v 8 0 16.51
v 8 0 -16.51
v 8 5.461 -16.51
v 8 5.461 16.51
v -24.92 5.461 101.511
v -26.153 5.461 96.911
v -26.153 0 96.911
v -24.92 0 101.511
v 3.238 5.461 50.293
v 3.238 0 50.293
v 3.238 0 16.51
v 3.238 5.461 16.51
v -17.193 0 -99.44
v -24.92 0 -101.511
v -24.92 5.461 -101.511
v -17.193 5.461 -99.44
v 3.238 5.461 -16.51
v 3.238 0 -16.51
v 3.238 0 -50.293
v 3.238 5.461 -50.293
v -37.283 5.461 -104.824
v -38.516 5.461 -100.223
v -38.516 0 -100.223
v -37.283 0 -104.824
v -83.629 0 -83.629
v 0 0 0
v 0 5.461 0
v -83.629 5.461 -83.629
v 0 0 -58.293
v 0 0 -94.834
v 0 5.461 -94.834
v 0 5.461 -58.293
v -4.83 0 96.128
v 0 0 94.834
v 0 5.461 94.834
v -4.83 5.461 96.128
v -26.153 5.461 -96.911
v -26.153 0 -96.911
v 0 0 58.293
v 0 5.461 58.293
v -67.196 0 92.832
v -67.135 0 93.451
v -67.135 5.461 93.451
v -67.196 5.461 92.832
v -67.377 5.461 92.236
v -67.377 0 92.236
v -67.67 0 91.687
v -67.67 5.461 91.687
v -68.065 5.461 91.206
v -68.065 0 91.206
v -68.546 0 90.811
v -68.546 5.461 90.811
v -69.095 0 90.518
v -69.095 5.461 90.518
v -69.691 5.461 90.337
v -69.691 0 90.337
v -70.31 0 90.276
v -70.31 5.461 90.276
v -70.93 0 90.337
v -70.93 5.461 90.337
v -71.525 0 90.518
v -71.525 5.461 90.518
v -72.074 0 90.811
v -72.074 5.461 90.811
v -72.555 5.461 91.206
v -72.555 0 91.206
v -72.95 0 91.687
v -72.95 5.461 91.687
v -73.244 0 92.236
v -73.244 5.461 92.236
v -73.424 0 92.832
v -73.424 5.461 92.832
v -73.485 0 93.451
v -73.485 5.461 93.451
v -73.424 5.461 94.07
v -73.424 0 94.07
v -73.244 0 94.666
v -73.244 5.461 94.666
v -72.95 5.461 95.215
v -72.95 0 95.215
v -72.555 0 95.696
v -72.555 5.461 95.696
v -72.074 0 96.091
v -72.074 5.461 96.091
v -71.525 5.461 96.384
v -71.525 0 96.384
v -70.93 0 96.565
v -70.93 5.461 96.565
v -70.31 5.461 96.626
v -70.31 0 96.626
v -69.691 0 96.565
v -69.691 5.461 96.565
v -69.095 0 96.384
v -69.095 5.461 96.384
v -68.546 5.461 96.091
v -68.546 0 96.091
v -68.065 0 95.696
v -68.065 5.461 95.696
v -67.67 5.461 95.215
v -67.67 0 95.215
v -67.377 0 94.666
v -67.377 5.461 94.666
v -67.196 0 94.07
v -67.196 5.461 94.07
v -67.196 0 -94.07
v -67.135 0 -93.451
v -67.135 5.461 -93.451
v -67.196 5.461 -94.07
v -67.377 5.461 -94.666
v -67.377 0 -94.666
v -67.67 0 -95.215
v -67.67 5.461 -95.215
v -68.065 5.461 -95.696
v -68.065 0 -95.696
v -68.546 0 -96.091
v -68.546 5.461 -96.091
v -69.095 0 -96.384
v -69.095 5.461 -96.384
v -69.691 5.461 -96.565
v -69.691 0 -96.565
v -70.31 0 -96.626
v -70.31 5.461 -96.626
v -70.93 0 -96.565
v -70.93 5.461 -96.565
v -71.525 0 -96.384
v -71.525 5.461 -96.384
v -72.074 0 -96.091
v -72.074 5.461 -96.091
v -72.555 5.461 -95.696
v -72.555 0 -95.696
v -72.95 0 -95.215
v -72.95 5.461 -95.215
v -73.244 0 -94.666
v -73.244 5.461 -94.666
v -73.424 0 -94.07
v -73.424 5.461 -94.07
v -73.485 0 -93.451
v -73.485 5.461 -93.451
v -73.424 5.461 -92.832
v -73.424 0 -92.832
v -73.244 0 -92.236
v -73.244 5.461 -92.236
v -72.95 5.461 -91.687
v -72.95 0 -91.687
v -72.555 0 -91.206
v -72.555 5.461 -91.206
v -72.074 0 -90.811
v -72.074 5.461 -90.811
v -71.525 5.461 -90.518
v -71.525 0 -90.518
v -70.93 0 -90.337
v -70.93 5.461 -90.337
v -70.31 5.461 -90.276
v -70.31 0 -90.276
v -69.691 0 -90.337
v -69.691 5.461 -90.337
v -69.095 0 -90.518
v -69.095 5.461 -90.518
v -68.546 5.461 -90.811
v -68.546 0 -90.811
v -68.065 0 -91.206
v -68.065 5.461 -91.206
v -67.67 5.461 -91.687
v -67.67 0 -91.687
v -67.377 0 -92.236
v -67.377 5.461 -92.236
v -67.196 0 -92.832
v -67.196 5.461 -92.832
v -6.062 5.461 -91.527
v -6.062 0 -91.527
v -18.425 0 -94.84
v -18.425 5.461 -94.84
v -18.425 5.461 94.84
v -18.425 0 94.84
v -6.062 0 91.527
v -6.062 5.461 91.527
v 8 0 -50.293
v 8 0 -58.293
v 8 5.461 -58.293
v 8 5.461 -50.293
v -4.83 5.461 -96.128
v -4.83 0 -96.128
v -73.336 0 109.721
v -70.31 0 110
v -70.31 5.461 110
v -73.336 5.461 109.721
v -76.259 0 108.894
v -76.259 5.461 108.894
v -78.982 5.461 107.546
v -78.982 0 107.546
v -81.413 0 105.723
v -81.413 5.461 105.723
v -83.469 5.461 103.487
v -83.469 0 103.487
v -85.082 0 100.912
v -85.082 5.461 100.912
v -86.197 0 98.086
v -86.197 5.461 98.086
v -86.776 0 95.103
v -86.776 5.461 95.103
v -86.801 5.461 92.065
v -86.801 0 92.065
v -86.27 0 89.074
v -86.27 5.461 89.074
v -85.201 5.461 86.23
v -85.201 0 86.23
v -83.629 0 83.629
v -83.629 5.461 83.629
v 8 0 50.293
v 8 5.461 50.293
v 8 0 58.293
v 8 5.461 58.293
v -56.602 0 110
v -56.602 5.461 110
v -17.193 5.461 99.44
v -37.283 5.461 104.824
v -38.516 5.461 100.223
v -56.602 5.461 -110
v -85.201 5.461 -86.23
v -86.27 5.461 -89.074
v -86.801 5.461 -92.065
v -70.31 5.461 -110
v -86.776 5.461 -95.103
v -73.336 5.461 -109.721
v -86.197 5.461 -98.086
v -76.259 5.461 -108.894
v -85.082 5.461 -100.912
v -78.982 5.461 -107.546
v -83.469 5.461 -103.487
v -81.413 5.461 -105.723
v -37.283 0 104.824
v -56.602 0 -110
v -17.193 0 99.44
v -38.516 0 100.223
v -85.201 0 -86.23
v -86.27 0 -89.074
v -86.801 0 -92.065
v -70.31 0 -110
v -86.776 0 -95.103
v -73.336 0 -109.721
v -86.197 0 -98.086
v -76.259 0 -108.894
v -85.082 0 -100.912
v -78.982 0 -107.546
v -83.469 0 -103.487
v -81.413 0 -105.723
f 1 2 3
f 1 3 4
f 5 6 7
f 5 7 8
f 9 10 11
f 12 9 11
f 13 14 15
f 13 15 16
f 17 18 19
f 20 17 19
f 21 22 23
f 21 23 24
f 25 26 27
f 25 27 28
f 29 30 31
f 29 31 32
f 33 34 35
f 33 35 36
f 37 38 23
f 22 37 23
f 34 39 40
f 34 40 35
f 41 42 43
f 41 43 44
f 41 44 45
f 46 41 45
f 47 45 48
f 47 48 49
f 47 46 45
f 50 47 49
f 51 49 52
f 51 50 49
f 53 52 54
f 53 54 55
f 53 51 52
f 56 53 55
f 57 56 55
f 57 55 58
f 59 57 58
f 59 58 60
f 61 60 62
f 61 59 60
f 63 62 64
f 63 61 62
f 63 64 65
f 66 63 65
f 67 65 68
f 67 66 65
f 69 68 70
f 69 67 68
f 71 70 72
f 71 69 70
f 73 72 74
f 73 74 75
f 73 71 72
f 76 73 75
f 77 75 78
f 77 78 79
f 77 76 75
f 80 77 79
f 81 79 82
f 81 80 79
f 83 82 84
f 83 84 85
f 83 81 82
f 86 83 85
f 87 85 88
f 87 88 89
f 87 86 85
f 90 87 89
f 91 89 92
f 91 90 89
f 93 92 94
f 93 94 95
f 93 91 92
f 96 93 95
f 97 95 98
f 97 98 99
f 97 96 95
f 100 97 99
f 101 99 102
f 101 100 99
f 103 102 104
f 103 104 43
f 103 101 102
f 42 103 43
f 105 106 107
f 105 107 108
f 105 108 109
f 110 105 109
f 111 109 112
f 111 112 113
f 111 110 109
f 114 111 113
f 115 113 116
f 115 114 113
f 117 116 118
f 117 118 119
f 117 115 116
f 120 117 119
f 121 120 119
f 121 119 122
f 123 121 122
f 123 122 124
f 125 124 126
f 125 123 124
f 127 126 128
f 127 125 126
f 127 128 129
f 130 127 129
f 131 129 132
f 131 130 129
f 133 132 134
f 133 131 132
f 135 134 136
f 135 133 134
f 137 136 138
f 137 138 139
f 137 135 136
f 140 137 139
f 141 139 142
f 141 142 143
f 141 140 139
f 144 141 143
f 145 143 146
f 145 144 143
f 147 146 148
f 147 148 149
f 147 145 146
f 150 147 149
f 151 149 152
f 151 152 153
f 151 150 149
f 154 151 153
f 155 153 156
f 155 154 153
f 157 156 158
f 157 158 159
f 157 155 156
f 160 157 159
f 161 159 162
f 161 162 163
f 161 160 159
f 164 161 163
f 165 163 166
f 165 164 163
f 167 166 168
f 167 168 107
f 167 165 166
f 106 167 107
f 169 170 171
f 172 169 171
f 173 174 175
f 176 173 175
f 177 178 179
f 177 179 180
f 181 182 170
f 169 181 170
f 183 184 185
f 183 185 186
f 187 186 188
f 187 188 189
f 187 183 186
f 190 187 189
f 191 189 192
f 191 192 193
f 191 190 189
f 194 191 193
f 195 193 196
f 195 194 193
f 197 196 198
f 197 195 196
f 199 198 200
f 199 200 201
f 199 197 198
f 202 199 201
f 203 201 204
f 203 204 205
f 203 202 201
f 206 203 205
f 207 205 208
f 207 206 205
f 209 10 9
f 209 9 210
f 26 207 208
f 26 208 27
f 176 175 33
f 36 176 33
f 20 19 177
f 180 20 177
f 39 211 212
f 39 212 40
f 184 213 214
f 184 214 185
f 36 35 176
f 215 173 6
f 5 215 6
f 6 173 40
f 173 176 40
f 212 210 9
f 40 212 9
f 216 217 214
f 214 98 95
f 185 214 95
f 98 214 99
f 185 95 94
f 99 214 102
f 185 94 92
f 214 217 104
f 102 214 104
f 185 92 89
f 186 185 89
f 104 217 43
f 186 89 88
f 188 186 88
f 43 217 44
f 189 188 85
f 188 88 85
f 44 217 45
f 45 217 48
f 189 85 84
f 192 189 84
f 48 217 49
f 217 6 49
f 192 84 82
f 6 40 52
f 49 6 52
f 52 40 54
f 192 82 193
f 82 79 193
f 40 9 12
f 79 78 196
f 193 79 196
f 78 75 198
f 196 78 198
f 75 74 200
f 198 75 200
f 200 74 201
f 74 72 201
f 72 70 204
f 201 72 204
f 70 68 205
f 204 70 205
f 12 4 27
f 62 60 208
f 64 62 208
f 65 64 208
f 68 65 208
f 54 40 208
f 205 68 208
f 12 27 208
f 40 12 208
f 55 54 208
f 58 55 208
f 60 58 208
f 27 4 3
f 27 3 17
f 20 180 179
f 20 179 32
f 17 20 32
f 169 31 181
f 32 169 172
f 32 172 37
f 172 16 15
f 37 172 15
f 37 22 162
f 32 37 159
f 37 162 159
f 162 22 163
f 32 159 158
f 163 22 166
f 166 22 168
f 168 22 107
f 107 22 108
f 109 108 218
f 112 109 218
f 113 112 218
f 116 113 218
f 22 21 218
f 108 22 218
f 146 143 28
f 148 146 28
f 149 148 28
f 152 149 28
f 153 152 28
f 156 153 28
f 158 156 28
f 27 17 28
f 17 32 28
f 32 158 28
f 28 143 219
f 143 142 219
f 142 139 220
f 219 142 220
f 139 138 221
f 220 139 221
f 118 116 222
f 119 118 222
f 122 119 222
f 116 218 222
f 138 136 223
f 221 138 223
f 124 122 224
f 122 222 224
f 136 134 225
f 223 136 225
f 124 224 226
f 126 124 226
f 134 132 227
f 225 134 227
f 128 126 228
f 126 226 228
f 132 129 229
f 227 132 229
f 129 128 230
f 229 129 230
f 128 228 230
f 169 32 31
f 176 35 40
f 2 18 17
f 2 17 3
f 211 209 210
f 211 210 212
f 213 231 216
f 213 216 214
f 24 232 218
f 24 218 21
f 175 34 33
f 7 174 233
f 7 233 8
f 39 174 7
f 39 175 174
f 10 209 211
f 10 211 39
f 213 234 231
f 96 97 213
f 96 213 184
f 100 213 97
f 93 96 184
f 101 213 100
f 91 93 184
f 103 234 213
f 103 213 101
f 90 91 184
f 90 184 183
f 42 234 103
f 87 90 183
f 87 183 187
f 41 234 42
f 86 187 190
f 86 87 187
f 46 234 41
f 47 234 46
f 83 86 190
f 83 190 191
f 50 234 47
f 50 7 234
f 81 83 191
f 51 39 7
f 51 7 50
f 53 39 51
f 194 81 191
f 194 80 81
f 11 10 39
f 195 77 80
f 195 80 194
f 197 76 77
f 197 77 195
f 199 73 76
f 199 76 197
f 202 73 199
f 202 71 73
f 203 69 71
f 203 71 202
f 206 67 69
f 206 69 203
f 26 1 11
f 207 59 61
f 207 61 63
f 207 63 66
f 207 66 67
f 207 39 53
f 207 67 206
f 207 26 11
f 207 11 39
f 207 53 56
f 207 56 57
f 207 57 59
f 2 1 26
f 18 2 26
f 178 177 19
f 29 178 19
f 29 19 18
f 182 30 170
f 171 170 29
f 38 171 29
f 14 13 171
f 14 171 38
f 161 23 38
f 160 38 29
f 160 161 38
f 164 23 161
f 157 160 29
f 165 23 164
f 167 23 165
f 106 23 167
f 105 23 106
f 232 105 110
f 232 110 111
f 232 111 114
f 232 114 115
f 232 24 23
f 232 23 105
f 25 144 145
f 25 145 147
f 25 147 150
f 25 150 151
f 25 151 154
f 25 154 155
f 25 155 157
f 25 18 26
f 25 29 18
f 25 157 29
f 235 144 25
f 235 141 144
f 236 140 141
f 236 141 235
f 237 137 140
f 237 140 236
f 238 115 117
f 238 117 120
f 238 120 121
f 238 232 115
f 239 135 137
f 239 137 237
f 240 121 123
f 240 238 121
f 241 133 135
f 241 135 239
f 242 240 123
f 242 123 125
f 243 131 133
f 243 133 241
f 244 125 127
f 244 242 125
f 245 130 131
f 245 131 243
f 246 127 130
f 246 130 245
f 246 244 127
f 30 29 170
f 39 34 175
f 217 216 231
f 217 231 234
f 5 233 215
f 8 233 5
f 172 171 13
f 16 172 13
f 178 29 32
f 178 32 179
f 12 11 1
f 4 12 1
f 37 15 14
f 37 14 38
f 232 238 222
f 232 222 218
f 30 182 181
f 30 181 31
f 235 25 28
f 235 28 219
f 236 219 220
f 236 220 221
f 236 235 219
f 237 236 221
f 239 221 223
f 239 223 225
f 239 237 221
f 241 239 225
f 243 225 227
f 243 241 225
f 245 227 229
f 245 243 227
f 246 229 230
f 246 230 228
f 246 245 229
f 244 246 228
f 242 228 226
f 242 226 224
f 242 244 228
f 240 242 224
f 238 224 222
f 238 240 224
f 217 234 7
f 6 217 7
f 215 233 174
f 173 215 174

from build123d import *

# Parameters (mm, degrees)
SKETCH1_R           = 3.175
BOSS_EXTRUDE1_DEPTH = 5.461
SKETCH3_W           = 4.7625
SKETCH3_H           = 33.783
CUT_EXTRUDE2_DEPTH  = 10


with BuildPart() as part:
    # Sketch1 → Boss-Extrude1 (new body)
    with BuildSketch(Plane(origin=(0, 0, 0), x_dir=(1, 0, 0), z_dir=(0, 1, 0))):
        with BuildLine():
            Line((0, 0), (-83.629476528, 83.629476528))
            ThreePointArc((-83.629476528, 83.629476528), (-85.081850373, 100.91197572), (-70.310188895, 110))
            Line((-70.310188895, 110), (-56.601944845, 110))
            Line((-56.601944845, 110), (0, 94.833554589))
            Line((0, 94.833554589), (0, 58.293))
            Line((0, 58.293), (8, 58.293))
            Line((8, 58.293), (8, -58.293))
            Line((8, -58.293), (0, -58.293))
            Line((0, -58.293), (0, -94.833554589))
            Line((0, -94.833554589), (-56.601944845, -110))
            Line((-56.601944845, -110), (-70.310188895, -110))
            ThreePointArc((-70.310188895, -110), (-85.081850373, -100.91197572), (-83.629476528, -83.629476528))
            Line((-83.629476528, -83.629476528), (0, 0))
        make_face()
        with Locations((-70.310188895, 93.451069294)):
            Circle(SKETCH1_R, mode=Mode.SUBTRACT)
        with Locations((-70.310188895, -93.451069294)):
            Circle(SKETCH1_R, mode=Mode.SUBTRACT)
    extrude(amount=BOSS_EXTRUDE1_DEPTH)

    # Sketch3 → Cut-Extrude2 (cut)
    with BuildSketch(Plane(origin=(0, 0, 0), x_dir=(1, 0, 0), z_dir=(0, 1, 0))):
        Polygon((-37.283428319, 104.823619098), (-24.920232031, 101.510910637), (-26.152857733, 96.910688889), (-38.516054022, 100.22339735), align=None)
        Polygon((-17.19282542, 99.440358276), (-4.829629131, 96.127649814), (-6.062254834, 91.527428067), (-18.425451123, 94.840136528), align=None)
        Polygon((-18.425451123, -94.840136528), (-6.062254834, -91.527428067), (-4.829629131, -96.127649814), (-17.19282542, -99.440358276), align=None)
        Polygon((-38.516054022, -100.22339735), (-26.152857733, -96.910688889), (-24.920232031, -101.510910637), (-37.283428319, -104.823619098), align=None)
        with Locations((5.61875, 33.4015)):
            Rectangle(SKETCH3_W, SKETCH3_H)
        with Locations((5.61875, -33.4015)):
            Rectangle(SKETCH3_W, SKETCH3_H)
    extrude(amount=CUT_EXTRUDE2_DEPTH, mode=Mode.SUBTRACT)


solid = part.part
